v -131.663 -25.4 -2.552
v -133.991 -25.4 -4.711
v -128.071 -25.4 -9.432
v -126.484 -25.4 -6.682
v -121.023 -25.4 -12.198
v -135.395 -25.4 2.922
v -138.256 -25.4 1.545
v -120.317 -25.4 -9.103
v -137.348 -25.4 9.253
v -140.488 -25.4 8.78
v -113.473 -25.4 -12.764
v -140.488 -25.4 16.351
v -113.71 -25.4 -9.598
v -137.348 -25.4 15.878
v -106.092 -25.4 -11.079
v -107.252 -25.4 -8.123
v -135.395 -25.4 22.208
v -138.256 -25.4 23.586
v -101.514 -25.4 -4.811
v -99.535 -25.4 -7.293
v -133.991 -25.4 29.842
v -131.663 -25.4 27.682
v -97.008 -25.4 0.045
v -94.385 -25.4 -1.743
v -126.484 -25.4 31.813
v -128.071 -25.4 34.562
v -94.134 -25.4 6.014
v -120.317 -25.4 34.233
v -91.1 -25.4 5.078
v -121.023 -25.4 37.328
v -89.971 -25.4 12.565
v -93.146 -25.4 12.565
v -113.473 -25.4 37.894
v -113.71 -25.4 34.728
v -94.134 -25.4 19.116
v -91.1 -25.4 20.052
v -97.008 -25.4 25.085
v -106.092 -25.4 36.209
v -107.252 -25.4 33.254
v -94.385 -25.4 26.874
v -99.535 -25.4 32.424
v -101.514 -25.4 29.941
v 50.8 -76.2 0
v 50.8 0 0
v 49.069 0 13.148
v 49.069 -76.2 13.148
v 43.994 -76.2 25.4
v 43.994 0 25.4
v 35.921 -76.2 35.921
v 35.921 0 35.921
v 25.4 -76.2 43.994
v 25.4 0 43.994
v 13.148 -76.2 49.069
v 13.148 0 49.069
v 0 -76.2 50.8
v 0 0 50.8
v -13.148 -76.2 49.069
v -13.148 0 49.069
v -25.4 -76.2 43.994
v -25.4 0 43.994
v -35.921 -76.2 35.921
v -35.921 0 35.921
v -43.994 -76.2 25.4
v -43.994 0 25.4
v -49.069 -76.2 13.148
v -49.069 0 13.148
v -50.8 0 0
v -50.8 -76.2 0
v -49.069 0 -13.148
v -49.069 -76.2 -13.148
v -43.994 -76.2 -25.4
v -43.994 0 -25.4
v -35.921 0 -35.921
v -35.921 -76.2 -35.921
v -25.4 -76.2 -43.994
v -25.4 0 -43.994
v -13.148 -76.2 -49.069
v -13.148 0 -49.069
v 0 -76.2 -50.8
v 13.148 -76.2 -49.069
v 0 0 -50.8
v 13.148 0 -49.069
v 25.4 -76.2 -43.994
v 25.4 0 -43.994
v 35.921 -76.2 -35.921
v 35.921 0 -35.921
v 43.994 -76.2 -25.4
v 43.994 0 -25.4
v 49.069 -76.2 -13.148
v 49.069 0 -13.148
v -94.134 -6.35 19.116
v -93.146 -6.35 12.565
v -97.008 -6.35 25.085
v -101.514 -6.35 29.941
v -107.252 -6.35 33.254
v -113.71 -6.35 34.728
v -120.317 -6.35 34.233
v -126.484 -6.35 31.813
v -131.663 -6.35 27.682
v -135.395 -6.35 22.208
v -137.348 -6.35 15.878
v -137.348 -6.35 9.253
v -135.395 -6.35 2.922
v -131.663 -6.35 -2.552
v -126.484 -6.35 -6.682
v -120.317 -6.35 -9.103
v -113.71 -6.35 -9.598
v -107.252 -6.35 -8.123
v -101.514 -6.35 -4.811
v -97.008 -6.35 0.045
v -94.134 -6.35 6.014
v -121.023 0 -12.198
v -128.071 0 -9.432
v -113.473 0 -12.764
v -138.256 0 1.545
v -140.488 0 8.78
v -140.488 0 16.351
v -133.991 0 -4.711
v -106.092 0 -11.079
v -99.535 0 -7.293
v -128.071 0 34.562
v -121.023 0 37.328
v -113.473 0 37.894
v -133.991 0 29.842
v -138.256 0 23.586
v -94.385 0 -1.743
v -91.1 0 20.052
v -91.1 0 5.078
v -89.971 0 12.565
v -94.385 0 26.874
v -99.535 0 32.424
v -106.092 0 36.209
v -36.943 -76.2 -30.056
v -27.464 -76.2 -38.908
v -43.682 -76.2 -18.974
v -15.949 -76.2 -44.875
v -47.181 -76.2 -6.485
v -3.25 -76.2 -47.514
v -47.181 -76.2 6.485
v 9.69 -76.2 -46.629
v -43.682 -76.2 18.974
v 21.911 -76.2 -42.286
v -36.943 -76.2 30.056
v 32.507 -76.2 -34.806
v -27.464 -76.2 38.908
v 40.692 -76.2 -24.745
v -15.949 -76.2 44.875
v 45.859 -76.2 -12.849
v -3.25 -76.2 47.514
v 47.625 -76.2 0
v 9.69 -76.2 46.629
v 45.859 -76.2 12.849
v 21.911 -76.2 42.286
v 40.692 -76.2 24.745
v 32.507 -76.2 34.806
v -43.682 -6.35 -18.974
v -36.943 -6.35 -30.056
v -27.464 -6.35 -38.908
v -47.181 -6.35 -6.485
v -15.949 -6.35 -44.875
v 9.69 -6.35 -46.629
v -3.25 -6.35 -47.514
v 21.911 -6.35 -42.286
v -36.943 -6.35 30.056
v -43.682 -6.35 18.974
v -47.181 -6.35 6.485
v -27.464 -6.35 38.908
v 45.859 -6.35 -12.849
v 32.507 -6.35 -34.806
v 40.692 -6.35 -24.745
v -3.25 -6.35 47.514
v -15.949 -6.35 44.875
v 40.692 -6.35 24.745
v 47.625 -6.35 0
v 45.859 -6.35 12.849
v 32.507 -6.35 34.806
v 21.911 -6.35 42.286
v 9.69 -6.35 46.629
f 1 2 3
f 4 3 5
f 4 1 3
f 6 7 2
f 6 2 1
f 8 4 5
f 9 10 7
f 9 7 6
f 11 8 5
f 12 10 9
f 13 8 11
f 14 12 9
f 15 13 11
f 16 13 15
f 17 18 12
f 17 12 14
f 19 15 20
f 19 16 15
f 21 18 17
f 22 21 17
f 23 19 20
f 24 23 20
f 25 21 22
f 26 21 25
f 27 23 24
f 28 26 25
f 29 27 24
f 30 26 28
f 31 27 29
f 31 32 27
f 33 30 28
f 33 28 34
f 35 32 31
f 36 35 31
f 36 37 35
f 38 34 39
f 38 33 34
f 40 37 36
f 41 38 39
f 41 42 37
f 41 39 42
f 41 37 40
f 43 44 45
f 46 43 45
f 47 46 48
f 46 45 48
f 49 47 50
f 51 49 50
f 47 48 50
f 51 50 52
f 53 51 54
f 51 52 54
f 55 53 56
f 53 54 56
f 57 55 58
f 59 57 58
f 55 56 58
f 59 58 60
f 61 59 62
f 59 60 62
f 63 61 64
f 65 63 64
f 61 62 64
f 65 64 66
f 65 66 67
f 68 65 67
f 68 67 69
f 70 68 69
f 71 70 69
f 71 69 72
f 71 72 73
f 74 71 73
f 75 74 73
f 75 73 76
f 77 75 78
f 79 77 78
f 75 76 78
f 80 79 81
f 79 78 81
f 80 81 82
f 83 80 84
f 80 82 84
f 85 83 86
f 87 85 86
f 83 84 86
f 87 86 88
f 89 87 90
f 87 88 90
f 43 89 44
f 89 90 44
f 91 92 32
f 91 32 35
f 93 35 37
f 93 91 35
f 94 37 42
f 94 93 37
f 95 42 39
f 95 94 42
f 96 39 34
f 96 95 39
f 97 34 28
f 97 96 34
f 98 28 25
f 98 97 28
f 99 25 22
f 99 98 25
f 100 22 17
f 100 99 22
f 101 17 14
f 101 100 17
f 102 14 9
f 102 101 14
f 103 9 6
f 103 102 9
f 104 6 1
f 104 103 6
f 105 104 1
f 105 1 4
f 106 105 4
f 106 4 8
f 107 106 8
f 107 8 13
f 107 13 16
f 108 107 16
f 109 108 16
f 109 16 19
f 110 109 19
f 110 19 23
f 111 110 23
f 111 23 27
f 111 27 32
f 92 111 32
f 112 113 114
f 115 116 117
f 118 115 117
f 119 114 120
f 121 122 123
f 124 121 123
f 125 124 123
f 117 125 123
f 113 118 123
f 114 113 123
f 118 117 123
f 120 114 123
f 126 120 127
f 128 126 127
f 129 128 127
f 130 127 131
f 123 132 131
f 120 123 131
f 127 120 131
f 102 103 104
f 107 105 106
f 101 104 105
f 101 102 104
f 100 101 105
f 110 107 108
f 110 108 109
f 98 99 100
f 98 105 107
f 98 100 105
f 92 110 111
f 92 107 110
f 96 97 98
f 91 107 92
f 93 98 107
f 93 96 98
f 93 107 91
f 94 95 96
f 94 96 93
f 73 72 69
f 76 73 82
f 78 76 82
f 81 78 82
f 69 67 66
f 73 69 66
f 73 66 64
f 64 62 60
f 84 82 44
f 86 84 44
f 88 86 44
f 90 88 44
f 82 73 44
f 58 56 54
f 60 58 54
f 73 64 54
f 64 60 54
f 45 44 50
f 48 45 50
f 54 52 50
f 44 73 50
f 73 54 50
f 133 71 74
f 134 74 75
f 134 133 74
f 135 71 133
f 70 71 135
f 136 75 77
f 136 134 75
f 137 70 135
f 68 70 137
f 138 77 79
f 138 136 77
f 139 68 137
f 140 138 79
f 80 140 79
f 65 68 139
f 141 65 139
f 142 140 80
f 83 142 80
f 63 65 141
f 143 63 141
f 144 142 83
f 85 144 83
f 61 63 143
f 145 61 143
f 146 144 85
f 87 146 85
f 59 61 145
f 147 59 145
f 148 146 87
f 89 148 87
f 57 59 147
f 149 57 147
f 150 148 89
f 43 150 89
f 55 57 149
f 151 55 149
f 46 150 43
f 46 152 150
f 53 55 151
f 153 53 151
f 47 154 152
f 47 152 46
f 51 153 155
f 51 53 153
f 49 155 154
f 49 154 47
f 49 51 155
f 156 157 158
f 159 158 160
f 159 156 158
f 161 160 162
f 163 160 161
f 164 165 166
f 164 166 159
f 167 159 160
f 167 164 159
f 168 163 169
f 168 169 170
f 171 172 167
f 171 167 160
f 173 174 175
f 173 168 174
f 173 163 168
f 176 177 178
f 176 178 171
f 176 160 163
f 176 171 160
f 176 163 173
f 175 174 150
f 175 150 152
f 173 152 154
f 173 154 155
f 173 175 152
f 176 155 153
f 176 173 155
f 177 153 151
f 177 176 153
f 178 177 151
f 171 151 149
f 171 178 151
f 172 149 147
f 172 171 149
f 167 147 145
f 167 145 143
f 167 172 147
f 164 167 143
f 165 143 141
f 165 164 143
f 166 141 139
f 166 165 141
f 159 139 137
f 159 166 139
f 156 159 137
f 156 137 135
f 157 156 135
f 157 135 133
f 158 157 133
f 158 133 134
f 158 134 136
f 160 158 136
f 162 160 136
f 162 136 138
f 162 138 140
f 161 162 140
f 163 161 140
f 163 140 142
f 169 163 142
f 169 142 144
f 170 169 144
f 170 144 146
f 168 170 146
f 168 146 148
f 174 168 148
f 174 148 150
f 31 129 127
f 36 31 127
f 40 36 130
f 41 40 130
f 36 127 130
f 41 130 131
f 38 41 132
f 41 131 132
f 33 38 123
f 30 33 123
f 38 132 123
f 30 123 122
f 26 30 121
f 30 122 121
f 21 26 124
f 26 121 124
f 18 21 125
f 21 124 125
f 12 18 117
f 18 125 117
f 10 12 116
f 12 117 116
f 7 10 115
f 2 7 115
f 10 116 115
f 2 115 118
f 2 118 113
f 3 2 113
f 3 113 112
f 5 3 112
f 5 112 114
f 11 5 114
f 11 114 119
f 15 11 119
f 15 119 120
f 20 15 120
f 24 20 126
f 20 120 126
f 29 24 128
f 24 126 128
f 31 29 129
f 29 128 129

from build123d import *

# Parameters (mm, degrees)
F0_R     = 25.4
F0_R_2   = 22.225
F1_DEPTH = 25.4
F0_R_3   = 50.8
F0_R_4   = 47.625
F2_DEPTH = 76.2
F3_DEPTH = 6.35
F4_DEPTH = 6.35


with BuildPart() as f1:
    # F0 (on Front) → F1 (new body)
    with BuildSketch(Plane.XZ):
        with Locations((-115.371361, 12.565194)):
            Circle(F0_R)
        with Locations((-115.371361, 12.565194)):
            Circle(F0_R_2, mode=Mode.SUBTRACT)
    extrude(amount=F1_DEPTH)

    # F0 (on Front) → F3 (join)
    with BuildSketch(Plane.XZ):
        with Locations((-115.371361, 12.565194)):
            Circle(F0_R_2)
    extrude(amount=F3_DEPTH)


with BuildPart() as f2:
    # F0 (on Front) → F2 (new body)
    with BuildSketch(Plane.XZ):
        Circle(F0_R_3)
        Circle(F0_R_4, mode=Mode.SUBTRACT)
    extrude(amount=F2_DEPTH)

    # F0 (on Front) → F4 (join)
    with BuildSketch(Plane.XZ):
        Circle(F0_R_4)
    extrude(amount=F4_DEPTH)


solid = Compound([f1.part, f2.part])
